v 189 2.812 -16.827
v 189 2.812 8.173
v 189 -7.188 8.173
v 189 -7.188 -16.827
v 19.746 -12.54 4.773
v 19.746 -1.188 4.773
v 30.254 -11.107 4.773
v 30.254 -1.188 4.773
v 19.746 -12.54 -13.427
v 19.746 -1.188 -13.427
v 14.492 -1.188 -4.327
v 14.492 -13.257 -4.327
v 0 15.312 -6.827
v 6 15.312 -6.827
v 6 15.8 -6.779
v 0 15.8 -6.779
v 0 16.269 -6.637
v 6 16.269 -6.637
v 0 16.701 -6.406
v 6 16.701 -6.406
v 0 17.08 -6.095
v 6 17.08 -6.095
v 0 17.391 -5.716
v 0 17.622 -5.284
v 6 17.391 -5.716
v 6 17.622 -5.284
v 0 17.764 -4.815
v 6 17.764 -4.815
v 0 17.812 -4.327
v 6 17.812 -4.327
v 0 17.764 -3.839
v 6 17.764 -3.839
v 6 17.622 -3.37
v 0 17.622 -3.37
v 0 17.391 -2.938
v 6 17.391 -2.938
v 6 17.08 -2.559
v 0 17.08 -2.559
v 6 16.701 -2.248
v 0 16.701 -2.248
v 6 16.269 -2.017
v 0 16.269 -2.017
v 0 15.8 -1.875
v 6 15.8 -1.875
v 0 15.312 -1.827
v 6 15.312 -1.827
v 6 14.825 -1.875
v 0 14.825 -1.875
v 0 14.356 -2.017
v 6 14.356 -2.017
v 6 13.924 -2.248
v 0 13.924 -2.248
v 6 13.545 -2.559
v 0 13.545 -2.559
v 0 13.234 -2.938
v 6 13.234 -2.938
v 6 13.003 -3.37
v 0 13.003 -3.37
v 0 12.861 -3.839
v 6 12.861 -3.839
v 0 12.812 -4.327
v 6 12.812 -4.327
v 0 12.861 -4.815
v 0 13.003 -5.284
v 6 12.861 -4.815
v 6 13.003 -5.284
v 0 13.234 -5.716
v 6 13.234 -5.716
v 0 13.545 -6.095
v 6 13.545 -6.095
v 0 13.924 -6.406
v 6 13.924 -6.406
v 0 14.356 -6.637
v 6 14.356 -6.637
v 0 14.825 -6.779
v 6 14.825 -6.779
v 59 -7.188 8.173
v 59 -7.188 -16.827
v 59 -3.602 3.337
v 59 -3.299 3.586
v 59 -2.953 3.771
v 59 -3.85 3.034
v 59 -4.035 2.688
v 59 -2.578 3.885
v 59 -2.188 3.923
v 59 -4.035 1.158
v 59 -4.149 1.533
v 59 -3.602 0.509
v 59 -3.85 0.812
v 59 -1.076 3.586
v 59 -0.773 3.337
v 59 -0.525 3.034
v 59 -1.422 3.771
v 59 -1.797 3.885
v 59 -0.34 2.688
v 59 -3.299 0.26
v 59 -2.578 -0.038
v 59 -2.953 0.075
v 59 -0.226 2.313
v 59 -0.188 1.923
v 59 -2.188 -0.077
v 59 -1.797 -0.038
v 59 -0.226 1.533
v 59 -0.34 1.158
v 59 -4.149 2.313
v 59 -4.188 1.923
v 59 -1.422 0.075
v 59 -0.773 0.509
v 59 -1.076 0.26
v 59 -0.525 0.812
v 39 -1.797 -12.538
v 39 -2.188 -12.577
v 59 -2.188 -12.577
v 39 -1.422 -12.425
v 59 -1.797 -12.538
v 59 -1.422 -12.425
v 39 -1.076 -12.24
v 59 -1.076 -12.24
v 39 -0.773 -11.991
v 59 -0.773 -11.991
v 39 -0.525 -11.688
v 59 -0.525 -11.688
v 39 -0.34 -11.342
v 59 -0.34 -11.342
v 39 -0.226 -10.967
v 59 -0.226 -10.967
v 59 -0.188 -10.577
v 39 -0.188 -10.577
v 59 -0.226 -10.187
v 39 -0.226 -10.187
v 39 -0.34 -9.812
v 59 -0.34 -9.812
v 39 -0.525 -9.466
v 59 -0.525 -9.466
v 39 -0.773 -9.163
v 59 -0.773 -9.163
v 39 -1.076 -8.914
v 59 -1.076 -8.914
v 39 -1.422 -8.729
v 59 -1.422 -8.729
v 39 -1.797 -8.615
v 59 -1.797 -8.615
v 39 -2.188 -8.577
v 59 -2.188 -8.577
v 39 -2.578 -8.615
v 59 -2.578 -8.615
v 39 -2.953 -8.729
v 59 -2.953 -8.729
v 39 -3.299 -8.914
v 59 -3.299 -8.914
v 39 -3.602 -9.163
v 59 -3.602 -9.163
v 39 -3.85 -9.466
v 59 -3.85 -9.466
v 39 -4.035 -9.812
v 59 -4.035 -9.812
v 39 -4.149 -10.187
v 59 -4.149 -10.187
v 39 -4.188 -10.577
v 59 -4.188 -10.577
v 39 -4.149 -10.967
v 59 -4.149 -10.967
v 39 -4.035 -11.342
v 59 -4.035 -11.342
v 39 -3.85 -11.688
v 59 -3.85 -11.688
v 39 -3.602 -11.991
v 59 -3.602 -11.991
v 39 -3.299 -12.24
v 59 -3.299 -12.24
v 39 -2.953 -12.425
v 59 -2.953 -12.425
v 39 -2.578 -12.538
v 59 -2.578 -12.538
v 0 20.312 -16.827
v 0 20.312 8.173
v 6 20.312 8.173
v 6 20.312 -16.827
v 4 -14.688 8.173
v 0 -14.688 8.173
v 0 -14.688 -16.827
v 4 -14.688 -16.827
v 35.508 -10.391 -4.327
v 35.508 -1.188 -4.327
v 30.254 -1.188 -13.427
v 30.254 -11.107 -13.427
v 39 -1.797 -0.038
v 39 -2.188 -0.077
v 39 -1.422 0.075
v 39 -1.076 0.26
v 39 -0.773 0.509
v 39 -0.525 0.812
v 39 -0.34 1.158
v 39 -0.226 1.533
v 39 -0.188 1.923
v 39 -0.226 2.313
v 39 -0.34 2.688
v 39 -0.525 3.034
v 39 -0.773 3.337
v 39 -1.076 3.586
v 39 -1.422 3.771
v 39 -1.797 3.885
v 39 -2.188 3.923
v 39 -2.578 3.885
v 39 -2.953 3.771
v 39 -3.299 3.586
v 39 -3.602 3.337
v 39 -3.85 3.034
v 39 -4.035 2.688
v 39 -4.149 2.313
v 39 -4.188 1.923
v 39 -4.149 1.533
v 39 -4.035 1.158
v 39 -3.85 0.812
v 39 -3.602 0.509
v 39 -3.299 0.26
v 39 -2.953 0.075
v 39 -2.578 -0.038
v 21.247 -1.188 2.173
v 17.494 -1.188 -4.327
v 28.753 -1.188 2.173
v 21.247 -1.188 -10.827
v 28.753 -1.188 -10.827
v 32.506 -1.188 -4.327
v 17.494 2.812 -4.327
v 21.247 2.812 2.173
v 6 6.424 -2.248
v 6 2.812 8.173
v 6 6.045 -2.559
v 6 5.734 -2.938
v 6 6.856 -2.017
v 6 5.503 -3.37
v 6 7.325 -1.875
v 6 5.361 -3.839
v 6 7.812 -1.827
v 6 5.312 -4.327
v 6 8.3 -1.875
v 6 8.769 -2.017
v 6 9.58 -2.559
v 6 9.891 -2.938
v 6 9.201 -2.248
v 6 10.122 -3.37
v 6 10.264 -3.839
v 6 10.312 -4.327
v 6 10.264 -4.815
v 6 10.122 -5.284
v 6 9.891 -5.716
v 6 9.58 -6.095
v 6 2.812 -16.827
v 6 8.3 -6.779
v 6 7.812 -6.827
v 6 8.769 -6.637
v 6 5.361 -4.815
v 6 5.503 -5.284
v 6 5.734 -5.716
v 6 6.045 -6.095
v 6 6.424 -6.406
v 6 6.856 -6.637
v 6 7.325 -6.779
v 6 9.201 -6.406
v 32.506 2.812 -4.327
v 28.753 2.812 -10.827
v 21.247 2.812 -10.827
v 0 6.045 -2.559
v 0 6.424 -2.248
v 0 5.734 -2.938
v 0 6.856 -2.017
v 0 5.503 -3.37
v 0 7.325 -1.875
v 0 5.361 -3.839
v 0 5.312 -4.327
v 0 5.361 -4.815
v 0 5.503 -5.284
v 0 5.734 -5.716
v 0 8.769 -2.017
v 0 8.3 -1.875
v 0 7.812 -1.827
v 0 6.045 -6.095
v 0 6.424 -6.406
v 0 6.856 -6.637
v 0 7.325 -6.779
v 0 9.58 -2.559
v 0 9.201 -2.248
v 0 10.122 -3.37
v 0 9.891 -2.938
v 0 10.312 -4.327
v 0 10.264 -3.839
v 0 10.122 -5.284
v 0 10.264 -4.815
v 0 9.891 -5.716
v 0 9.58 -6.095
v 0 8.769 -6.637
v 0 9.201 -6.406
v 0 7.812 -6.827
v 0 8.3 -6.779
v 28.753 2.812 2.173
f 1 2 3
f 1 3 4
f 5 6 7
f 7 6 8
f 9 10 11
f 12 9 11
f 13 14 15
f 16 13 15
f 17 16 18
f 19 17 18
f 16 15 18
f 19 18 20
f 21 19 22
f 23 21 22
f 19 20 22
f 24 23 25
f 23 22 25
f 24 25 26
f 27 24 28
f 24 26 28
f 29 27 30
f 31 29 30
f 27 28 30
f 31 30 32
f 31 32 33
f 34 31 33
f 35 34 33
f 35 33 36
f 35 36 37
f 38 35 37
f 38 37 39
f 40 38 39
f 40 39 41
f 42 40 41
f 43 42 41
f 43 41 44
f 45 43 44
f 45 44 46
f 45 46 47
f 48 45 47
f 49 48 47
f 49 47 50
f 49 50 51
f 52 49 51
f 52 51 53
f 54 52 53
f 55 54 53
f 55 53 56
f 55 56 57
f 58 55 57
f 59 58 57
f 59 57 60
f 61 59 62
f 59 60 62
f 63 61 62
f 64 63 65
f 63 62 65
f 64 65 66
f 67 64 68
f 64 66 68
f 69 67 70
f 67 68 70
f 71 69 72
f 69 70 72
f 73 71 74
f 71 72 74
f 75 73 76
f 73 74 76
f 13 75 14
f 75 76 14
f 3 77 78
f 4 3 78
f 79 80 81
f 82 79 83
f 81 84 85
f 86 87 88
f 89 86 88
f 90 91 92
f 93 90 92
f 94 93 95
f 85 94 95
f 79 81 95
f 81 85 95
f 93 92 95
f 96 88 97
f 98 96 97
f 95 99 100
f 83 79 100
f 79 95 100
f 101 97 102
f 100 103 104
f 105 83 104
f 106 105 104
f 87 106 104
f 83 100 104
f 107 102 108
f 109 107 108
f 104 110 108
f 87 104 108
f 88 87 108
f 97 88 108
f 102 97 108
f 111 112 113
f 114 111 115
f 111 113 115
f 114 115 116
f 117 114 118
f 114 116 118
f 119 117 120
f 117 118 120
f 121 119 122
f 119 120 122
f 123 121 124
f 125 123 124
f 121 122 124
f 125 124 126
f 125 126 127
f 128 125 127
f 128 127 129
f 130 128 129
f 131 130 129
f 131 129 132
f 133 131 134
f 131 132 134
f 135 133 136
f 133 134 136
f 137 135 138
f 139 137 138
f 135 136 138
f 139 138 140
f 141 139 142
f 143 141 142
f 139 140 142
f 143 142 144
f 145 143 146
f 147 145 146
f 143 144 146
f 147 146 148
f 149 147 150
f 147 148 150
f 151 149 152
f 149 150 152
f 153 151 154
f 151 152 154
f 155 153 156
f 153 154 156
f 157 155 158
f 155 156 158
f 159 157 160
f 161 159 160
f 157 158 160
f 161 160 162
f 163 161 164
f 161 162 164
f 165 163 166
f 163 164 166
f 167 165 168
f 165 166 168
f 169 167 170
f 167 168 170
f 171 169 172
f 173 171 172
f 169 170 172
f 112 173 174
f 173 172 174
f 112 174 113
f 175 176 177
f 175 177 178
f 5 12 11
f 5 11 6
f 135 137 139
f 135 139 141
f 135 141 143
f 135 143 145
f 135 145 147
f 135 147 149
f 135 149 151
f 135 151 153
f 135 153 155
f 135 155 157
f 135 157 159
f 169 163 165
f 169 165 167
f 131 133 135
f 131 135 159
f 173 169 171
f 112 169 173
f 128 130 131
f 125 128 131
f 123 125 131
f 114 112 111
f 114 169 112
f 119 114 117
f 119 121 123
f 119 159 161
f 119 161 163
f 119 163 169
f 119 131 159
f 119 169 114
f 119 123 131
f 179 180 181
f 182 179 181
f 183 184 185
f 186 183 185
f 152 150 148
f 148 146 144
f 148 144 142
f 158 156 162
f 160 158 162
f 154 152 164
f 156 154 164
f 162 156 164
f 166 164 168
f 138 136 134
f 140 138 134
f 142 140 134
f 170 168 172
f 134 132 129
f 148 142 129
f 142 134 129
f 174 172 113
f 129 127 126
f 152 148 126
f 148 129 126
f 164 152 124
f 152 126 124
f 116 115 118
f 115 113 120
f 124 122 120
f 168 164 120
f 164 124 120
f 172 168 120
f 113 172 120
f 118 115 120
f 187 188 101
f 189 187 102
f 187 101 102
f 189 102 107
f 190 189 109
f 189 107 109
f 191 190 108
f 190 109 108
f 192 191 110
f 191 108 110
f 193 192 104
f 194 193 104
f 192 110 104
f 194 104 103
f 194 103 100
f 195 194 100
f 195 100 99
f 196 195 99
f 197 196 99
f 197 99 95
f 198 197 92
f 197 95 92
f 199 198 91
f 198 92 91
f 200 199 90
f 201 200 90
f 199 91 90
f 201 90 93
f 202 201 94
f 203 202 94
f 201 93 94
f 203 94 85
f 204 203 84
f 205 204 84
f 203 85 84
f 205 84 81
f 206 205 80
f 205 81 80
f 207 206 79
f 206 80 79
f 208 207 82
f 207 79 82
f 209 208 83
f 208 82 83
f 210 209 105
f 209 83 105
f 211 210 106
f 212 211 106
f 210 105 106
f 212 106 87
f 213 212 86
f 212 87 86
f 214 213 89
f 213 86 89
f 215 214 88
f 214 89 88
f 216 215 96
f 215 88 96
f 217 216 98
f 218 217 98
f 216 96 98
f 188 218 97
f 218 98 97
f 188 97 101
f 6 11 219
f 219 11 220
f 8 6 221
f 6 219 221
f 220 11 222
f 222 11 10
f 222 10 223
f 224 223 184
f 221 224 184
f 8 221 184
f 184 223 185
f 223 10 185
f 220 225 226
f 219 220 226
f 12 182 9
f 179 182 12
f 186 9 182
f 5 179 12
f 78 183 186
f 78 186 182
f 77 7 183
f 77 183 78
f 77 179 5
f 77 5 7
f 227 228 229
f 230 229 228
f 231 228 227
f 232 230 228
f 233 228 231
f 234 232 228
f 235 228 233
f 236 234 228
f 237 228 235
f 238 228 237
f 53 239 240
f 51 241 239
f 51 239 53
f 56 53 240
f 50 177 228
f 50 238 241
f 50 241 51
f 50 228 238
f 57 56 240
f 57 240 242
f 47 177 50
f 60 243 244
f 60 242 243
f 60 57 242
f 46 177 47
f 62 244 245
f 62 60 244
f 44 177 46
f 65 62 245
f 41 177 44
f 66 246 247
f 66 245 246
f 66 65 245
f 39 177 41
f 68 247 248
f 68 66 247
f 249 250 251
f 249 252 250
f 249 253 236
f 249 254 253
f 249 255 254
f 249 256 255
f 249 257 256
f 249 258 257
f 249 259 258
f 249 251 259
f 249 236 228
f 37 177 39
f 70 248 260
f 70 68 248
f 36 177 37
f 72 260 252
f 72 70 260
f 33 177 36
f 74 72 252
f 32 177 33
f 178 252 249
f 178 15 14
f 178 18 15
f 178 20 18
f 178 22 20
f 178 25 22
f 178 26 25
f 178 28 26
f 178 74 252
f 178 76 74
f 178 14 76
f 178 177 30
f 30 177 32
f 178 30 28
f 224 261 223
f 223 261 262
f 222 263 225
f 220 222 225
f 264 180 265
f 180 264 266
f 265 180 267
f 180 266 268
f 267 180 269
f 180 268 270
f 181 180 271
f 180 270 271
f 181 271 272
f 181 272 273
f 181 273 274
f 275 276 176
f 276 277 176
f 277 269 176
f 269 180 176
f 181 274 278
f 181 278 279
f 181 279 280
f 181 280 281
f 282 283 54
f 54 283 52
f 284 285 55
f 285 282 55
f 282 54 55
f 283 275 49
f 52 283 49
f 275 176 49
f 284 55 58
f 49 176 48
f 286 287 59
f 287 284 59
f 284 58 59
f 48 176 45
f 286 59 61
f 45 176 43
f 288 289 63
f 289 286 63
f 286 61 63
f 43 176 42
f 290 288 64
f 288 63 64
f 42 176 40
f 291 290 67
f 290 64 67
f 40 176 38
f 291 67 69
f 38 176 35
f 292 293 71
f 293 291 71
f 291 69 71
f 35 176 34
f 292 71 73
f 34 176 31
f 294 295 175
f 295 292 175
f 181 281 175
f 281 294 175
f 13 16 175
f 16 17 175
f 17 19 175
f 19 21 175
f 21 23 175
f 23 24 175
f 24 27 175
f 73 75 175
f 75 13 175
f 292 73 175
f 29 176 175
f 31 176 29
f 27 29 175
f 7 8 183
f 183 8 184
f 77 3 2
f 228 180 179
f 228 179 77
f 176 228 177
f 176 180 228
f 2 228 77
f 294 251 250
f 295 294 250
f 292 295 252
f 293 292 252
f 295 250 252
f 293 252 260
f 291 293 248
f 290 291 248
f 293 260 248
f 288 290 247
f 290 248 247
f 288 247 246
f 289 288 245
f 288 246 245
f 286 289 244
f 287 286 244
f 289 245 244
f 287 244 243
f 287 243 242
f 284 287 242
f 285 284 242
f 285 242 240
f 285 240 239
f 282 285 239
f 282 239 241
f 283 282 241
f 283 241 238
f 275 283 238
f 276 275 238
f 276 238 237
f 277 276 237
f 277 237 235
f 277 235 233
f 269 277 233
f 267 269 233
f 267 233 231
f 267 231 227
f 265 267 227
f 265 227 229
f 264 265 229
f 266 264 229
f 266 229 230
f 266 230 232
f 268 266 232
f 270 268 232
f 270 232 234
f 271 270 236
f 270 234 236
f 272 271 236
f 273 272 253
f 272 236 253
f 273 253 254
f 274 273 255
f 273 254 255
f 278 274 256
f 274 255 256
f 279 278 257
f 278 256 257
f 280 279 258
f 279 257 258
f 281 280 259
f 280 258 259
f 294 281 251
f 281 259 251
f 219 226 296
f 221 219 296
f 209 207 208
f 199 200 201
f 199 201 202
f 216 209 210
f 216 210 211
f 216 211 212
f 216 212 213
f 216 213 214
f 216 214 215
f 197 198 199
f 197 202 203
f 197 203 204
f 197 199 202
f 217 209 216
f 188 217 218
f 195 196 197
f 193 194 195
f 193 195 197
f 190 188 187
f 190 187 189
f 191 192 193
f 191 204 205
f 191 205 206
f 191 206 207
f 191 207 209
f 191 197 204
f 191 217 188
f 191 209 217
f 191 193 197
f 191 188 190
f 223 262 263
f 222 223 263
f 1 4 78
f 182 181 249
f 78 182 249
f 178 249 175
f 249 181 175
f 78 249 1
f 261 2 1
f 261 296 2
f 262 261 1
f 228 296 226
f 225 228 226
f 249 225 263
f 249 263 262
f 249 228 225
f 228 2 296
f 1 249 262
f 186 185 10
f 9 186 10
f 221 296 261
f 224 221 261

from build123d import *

# Parameters (mm, degrees)
CROQUIS3_W              = 25
CROQUIS3_H              = 35
SALIENTE_EXTRUIR2_DEPTH = 4
CROQUIS5_W              = 25
CROQUIS5_H              = 17.5
SALIENTE_EXTRUIR3_DEPTH = 2
CROQUIS7_W              = 25
CROQUIS7_H              = 10
SALIENTE_EXTRUIR5_DEPTH = 55
CROQUIS8_R              = 2.5
CORTAR_EXTRUIR1_DEPTH   = 55
SALIENTE_EXTRUIR6_DEPTH = 25
CORTAR_EXTRUIR3_DEPTH   = 4
CROQUIS11_R             = 2
CORTAR_EXTRUIR4_DEPTH   = 20
CORTAR_EXTRUIR5_DEPTH   = 45
CROQUIS13_W             = 25
CROQUIS13_H             = 10
SALIENTE_EXTRUIR7_DEPTH = 130


with BuildPart() as part:
    # Croquis3 → Saliente-Extruir2 (new body)
    with BuildSketch(Plane(origin=(0, 0, 0), x_dir=(0, 0, -1), z_dir=(1, 0, 0))):
        with Locations((4.326923077, 2.8125)):
            Rectangle(CROQUIS3_W, CROQUIS3_H)
    extrude(amount=SALIENTE_EXTRUIR2_DEPTH)

    # Croquis5 → Saliente-Extruir3 (add)
    with BuildSketch(Plane(origin=(4, 0, 0), x_dir=(0, 0, -1), z_dir=(1, 0, 0))):
        with Locations((4.326923077, 11.5625)):
            Rectangle(CROQUIS5_W, CROQUIS5_H)
    extrude(amount=SALIENTE_EXTRUIR3_DEPTH)

    # Croquis7 → Saliente-Extruir5 (add)
    with BuildSketch(Plane(origin=(4, 0, 0), x_dir=(0, 0, -1), z_dir=(1, 0, 0))):
        with Locations((4.326923077, -2.1875)):
            Rectangle(CROQUIS7_W, CROQUIS7_H)
    extrude(amount=SALIENTE_EXTRUIR5_DEPTH)

    # Croquis8 → Cortar-Extruir1 (cut)
    with BuildSketch(Plane(origin=(6, 0, 0), x_dir=(0, 0, -1), z_dir=(1, 0, 0))):
        with Locations((4.326923077, 15.3125)):
            Circle(CROQUIS8_R)
        with Locations((4.326923077, 7.8125)):
            Circle(CROQUIS8_R)
    extrude(amount=-CORTAR_EXTRUIR1_DEPTH, mode=Mode.SUBTRACT)

    # Croquis10 → Saliente-Extruir6 (add, through all)
    with BuildSketch(Plane.XY.offset(8.173076923)):
        Polygon((4, -14.6875), (59, -7.1875), (4, -7.1875), align=None)
    extrude(amount=-SALIENTE_EXTRUIR6_DEPTH)

    # Croquis9 → Cortar-Extruir3 (cut)
    with BuildSketch(Plane(origin=(0, 2.8125, 0), x_dir=(1, 0, 0), z_dir=(0, 1, 0))):
        Polygon((32.505553499, 4.326923077), (28.75277675, 10.826923077), (21.24722325, 10.826923077), (17.494446501, 4.326923077), (21.24722325, -2.173076923), (28.75277675, -2.173076923), align=None)
    extrude(amount=-CORTAR_EXTRUIR3_DEPTH, mode=Mode.SUBTRACT)

    # Croquis11 → Cortar-Extruir4 (cut)
    with BuildSketch(Plane(origin=(59, 0, 0), x_dir=(0, 0, -1), z_dir=(1, 0, 0))):
        with Locations((-1.923076923, -2.1875)):
            Circle(CROQUIS11_R)
        with Locations((10.576923077, -2.1875)):
            Circle(CROQUIS11_R)
    extrude(amount=-CORTAR_EXTRUIR4_DEPTH, mode=Mode.SUBTRACT)

    # Croquis12 → Cortar-Extruir5 (cut)
    with BuildSketch(Plane(origin=(0, -1.1875, 0), x_dir=(1, 0, 0), z_dir=(0, 1, 0))):
        Polygon((30.25388745, 13.426923077), (19.74611255, 13.426923077), (14.492225101, 4.326923077), (19.74611255, -4.773076923), (30.25388745, -4.773076923), (35.507774899, 4.326923077), align=None)
    extrude(amount=-CORTAR_EXTRUIR5_DEPTH, mode=Mode.SUBTRACT)

    # Croquis13 → Saliente-Extruir7 (add)
    with BuildSketch(Plane(origin=(59, 0, 0), x_dir=(0, 0, -1), z_dir=(1, 0, 0))):
        with Locations((4.326923077, -2.1875)):
            Rectangle(CROQUIS13_W, CROQUIS13_H)
    extrude(amount=SALIENTE_EXTRUIR7_DEPTH)


solid = part.part
